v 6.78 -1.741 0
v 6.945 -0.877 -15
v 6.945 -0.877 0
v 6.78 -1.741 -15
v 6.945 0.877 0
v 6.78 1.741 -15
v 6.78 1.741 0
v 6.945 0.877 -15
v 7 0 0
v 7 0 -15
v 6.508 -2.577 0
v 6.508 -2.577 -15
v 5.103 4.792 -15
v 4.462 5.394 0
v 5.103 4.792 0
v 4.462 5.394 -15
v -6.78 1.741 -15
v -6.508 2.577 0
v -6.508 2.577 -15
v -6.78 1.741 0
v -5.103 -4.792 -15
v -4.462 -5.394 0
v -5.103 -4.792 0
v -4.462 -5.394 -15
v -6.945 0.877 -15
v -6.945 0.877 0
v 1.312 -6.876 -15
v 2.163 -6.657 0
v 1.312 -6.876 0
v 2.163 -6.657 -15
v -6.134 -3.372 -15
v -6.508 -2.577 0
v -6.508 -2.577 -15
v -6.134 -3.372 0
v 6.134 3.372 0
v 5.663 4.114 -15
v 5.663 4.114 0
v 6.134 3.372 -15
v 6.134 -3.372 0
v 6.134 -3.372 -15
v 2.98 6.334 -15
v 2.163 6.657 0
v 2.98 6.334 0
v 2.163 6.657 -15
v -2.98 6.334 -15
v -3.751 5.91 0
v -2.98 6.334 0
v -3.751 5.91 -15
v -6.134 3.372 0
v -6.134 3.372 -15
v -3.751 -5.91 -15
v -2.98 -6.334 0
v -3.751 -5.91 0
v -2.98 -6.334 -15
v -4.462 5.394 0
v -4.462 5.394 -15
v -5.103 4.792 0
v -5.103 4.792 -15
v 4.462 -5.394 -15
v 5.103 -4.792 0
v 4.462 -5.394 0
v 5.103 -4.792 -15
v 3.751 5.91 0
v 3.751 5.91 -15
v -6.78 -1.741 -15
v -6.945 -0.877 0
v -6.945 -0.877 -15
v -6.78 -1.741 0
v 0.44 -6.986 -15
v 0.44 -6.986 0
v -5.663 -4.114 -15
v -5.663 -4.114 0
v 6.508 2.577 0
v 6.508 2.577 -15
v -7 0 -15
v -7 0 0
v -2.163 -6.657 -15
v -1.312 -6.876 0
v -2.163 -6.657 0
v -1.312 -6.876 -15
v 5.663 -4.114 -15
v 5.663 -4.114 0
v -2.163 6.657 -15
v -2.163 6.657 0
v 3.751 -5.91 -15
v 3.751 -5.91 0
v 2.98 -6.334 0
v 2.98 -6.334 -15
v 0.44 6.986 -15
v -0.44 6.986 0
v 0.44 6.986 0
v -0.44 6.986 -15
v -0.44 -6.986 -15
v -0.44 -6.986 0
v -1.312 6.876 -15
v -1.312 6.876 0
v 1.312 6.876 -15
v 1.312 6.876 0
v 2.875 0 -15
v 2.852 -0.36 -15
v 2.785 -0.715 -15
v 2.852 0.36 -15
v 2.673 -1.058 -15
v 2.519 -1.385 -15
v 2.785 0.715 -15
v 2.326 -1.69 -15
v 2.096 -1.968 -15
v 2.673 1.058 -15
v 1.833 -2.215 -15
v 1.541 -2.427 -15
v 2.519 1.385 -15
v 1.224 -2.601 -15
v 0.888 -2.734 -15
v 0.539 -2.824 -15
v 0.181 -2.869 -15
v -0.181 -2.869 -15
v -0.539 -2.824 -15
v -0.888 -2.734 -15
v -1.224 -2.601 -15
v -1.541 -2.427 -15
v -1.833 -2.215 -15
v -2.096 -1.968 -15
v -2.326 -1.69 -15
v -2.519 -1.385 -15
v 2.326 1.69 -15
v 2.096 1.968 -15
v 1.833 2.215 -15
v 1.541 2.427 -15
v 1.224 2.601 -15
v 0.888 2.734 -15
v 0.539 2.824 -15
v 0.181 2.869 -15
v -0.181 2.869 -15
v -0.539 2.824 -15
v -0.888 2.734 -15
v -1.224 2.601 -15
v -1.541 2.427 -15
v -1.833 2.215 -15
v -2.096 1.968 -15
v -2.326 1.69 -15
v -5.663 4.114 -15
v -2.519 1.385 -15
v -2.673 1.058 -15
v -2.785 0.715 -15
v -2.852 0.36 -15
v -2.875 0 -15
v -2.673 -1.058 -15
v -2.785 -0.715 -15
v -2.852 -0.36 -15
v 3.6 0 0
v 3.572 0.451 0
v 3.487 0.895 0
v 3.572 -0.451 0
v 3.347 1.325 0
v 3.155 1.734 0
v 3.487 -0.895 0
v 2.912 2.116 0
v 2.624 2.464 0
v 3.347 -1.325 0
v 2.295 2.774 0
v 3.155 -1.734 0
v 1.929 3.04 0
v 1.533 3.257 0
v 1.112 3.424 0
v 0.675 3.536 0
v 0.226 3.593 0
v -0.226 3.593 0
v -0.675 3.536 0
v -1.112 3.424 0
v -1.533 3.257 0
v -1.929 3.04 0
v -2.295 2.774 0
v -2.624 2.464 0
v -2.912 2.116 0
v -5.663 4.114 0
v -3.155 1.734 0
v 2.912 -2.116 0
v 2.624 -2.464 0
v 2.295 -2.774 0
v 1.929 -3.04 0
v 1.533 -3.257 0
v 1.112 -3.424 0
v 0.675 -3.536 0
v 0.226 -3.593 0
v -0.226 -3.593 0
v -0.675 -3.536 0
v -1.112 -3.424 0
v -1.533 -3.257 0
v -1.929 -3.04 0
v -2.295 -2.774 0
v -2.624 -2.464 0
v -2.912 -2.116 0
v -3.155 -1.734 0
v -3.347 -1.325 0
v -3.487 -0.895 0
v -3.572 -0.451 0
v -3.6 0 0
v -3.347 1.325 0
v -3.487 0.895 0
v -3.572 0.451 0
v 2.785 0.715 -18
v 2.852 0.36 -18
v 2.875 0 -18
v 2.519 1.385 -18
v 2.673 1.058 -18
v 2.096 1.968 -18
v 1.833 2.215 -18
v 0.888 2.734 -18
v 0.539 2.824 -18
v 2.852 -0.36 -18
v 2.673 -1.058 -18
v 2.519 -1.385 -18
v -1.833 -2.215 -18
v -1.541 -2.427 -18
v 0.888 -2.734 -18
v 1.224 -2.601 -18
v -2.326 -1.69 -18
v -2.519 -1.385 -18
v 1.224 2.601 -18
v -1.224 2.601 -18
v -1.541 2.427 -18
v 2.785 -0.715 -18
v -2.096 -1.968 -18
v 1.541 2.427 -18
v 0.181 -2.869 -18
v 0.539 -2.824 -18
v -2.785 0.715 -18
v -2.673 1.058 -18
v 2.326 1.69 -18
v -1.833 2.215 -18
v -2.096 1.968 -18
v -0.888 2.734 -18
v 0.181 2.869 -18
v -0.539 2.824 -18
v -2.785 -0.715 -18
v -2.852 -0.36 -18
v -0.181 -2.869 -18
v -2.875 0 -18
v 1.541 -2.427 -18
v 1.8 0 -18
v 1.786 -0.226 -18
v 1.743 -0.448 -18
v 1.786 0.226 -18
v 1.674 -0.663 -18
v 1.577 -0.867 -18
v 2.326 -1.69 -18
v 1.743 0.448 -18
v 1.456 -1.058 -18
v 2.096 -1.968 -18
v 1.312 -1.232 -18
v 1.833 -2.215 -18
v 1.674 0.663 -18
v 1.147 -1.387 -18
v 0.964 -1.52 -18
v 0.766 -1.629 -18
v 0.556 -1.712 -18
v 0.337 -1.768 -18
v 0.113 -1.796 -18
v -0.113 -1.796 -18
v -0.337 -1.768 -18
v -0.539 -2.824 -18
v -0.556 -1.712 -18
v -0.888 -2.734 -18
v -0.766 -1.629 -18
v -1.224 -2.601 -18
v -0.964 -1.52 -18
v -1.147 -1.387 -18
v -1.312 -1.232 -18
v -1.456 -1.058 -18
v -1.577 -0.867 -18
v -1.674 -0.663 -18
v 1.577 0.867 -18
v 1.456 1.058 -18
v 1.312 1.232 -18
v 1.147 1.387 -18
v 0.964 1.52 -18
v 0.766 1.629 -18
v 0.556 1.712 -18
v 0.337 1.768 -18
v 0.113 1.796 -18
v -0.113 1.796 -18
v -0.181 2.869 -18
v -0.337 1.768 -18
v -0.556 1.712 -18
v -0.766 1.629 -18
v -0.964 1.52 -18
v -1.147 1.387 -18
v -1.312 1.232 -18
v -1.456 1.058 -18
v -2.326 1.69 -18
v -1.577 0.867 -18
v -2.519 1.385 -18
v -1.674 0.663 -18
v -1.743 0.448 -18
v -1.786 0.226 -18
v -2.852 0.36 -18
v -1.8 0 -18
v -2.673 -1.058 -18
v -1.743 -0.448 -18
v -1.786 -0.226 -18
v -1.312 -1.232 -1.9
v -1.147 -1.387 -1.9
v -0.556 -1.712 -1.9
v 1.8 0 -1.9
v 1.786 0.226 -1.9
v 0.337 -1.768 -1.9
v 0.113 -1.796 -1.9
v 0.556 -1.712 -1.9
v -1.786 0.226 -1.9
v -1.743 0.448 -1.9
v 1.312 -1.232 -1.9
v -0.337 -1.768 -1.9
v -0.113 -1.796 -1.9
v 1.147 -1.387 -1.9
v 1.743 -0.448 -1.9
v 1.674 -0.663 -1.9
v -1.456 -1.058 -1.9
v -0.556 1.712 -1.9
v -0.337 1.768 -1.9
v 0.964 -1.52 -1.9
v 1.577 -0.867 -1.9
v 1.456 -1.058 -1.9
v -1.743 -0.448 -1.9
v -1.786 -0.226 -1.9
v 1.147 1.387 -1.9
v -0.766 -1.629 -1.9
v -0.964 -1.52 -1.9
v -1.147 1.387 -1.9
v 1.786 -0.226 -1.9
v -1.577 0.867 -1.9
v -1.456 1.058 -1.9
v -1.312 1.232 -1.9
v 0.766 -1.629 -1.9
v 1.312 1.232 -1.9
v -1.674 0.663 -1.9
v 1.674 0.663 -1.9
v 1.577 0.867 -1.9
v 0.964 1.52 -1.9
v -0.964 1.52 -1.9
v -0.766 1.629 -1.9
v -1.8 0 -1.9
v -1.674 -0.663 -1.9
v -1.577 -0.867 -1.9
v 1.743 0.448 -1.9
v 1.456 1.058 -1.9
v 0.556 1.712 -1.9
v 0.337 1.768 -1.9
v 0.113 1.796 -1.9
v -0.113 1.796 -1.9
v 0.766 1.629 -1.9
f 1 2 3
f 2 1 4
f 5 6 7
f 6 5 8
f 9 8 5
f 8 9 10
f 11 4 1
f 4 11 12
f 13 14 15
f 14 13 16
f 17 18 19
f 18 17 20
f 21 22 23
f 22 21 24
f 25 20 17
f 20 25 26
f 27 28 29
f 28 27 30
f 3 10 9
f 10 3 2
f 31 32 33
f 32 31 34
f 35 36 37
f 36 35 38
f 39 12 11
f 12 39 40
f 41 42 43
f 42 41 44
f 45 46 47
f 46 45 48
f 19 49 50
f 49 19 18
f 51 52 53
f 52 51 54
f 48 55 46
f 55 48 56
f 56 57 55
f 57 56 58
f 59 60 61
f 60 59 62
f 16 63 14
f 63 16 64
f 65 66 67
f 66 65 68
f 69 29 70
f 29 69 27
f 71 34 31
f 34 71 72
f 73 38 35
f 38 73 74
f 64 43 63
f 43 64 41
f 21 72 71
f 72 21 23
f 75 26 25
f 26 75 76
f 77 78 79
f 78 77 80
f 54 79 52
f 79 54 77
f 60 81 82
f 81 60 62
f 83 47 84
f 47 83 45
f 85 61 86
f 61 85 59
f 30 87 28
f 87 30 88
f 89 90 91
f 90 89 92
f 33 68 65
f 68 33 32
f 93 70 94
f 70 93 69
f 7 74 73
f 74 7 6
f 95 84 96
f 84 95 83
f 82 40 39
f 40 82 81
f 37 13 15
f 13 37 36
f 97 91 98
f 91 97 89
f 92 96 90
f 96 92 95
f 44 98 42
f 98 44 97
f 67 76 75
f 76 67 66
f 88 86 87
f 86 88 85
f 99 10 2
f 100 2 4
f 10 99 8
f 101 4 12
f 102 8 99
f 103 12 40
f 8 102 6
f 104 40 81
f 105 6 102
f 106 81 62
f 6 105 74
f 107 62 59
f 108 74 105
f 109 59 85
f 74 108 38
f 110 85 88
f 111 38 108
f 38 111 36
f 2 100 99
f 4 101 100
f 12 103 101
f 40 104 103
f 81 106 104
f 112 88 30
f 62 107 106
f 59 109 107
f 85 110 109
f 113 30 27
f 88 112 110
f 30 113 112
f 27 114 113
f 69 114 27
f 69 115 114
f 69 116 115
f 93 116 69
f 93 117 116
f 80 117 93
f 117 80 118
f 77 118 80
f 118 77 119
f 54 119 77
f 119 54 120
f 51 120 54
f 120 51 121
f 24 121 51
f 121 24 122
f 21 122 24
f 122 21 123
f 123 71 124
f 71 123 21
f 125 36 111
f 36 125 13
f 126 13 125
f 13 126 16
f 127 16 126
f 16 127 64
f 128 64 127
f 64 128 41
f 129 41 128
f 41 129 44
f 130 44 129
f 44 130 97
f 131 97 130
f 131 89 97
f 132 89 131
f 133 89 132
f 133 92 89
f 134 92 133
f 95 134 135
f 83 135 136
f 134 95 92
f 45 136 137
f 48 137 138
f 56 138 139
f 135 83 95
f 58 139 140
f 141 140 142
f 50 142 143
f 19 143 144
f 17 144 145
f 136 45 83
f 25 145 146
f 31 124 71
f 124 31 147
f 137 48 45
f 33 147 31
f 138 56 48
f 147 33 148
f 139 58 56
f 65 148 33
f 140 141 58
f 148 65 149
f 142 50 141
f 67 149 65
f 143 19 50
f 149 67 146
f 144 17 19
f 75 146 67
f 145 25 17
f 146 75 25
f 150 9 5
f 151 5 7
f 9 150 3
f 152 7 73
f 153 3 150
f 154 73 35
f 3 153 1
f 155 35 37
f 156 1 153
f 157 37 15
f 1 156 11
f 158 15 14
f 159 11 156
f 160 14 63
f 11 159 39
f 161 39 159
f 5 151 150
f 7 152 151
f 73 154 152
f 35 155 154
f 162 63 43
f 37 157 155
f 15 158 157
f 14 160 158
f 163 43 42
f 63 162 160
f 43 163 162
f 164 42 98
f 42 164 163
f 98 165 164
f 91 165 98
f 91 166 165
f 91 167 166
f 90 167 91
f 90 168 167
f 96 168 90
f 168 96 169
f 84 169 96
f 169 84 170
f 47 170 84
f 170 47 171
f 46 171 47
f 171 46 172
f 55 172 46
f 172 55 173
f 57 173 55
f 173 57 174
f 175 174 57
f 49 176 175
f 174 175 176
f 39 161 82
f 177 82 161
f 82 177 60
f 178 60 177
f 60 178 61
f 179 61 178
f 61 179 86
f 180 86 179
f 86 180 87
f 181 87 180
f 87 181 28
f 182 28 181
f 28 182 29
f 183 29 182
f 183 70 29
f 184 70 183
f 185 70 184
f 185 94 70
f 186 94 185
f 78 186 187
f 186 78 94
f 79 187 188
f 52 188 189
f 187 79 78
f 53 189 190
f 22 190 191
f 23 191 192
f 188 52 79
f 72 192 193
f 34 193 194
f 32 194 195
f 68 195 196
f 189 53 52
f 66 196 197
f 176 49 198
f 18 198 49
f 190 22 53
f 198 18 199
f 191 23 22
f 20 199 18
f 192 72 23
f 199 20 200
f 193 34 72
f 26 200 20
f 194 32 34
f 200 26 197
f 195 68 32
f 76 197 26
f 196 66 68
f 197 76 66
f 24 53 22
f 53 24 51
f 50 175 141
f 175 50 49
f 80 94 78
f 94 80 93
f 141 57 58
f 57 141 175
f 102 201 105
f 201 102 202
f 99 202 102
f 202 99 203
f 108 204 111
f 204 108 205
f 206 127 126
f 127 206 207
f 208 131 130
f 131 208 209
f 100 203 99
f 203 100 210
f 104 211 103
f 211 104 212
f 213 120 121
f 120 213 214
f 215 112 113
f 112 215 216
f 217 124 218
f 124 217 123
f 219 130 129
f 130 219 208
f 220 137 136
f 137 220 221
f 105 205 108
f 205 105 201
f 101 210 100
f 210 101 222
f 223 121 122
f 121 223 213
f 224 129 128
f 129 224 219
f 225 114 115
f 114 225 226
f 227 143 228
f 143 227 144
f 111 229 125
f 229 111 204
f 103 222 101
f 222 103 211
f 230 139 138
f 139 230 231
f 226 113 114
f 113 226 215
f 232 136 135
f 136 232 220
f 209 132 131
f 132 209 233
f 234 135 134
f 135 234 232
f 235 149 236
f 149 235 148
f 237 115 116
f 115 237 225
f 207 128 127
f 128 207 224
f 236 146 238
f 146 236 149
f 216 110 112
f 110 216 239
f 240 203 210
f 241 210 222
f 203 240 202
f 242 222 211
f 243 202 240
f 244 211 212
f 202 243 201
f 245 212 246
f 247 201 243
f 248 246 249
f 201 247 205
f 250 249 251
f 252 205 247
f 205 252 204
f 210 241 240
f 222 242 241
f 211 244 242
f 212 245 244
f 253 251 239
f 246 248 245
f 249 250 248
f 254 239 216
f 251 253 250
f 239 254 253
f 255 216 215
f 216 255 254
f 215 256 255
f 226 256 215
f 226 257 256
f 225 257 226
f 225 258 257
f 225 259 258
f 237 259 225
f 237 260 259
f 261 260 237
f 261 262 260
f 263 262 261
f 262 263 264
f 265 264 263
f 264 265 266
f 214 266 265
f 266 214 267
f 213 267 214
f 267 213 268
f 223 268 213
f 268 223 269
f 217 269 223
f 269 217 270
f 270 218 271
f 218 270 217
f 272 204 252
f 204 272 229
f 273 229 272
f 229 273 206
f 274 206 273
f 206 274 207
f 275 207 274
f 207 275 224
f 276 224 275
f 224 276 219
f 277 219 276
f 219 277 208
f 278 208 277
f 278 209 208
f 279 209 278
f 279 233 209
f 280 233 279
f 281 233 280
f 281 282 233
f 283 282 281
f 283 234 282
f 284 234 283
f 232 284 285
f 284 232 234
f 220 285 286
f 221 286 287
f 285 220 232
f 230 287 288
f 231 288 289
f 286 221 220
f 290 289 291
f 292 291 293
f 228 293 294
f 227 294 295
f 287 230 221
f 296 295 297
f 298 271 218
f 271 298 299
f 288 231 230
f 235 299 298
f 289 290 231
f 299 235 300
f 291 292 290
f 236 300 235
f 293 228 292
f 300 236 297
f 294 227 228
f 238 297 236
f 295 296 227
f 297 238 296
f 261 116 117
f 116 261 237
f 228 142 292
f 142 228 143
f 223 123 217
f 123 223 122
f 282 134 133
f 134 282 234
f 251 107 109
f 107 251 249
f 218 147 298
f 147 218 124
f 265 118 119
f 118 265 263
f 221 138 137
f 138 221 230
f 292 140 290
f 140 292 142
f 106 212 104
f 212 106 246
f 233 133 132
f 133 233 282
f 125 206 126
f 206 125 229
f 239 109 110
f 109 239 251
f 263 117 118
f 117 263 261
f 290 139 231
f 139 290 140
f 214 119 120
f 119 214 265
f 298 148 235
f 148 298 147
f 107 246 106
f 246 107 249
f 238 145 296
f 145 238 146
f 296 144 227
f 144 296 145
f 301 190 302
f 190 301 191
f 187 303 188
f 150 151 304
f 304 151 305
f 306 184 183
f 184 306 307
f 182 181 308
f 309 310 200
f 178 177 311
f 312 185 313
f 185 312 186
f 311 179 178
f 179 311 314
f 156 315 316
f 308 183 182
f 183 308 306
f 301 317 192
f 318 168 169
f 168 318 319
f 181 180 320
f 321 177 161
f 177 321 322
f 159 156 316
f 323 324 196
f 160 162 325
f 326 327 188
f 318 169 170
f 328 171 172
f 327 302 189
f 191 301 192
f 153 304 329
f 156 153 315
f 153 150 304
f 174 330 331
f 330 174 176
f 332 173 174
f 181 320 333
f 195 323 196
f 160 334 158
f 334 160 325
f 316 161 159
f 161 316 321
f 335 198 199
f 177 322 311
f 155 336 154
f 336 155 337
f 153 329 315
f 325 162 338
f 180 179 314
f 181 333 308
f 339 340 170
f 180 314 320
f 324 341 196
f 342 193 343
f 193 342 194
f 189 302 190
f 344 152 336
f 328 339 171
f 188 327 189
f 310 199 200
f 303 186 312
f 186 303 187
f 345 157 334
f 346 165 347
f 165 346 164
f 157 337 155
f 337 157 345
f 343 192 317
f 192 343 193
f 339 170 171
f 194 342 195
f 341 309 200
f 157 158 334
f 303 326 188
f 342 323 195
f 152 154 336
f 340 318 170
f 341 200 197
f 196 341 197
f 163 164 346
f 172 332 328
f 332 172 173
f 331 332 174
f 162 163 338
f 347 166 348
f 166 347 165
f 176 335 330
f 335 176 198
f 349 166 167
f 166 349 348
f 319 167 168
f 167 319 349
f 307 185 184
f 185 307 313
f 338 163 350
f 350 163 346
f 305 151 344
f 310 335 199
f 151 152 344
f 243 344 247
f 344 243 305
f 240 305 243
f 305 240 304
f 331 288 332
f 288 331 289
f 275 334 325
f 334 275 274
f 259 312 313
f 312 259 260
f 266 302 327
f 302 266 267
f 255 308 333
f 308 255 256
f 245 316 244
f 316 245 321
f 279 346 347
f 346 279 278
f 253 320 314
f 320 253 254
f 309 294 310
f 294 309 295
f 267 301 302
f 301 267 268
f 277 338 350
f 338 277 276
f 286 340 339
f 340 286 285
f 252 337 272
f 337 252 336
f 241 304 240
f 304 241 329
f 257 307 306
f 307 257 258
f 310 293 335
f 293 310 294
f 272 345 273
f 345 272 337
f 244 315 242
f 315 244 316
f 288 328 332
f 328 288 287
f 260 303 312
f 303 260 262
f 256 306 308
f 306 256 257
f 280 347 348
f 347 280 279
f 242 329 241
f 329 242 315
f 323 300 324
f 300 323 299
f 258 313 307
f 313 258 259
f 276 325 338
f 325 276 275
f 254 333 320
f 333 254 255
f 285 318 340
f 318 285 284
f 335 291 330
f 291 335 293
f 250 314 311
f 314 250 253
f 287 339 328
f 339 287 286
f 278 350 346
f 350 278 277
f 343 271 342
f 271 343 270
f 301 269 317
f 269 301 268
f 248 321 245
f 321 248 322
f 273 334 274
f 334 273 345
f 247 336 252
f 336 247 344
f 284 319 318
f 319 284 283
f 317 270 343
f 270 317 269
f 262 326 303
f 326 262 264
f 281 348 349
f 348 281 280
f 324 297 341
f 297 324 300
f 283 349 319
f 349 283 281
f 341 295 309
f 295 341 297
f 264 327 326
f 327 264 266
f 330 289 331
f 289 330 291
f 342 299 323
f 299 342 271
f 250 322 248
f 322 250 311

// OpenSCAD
$fn = 50;


difference() {
	union() {
		translate(v = [0, 0, -15.0000000000]) {
			cylinder(h = 15, r = 7.0000000000);
		}
		#translate(v = [0, 0, -18.0000000000]) {
			cylinder(h = 18, r = 2.8750000000);
		}
	}
	union() {
		translate(v = [0, 0, 0]) {
			rotate(a = [0, 0, 0]) {
				difference() {
					union() {
						translate(v = [0, 0, -18.0000000000]) {
							cylinder(h = 18, r = 1.5000000000);
						}
						translate(v = [0, 0, -1.9000000000]) {
							cylinder(h = 1.9000000000, r1 = 1.8000000000, r2 = 3.6000000000);
						}
						translate(v = [0, 0, -18.0000000000]) {
							cylinder(h = 18, r = 1.8000000000);
						}
						translate(v = [0, 0, -18.0000000000]) {
							cylinder(h = 18, r = 1.5000000000);
						}
					}
					union();
				}
			}
		}
	}
}
